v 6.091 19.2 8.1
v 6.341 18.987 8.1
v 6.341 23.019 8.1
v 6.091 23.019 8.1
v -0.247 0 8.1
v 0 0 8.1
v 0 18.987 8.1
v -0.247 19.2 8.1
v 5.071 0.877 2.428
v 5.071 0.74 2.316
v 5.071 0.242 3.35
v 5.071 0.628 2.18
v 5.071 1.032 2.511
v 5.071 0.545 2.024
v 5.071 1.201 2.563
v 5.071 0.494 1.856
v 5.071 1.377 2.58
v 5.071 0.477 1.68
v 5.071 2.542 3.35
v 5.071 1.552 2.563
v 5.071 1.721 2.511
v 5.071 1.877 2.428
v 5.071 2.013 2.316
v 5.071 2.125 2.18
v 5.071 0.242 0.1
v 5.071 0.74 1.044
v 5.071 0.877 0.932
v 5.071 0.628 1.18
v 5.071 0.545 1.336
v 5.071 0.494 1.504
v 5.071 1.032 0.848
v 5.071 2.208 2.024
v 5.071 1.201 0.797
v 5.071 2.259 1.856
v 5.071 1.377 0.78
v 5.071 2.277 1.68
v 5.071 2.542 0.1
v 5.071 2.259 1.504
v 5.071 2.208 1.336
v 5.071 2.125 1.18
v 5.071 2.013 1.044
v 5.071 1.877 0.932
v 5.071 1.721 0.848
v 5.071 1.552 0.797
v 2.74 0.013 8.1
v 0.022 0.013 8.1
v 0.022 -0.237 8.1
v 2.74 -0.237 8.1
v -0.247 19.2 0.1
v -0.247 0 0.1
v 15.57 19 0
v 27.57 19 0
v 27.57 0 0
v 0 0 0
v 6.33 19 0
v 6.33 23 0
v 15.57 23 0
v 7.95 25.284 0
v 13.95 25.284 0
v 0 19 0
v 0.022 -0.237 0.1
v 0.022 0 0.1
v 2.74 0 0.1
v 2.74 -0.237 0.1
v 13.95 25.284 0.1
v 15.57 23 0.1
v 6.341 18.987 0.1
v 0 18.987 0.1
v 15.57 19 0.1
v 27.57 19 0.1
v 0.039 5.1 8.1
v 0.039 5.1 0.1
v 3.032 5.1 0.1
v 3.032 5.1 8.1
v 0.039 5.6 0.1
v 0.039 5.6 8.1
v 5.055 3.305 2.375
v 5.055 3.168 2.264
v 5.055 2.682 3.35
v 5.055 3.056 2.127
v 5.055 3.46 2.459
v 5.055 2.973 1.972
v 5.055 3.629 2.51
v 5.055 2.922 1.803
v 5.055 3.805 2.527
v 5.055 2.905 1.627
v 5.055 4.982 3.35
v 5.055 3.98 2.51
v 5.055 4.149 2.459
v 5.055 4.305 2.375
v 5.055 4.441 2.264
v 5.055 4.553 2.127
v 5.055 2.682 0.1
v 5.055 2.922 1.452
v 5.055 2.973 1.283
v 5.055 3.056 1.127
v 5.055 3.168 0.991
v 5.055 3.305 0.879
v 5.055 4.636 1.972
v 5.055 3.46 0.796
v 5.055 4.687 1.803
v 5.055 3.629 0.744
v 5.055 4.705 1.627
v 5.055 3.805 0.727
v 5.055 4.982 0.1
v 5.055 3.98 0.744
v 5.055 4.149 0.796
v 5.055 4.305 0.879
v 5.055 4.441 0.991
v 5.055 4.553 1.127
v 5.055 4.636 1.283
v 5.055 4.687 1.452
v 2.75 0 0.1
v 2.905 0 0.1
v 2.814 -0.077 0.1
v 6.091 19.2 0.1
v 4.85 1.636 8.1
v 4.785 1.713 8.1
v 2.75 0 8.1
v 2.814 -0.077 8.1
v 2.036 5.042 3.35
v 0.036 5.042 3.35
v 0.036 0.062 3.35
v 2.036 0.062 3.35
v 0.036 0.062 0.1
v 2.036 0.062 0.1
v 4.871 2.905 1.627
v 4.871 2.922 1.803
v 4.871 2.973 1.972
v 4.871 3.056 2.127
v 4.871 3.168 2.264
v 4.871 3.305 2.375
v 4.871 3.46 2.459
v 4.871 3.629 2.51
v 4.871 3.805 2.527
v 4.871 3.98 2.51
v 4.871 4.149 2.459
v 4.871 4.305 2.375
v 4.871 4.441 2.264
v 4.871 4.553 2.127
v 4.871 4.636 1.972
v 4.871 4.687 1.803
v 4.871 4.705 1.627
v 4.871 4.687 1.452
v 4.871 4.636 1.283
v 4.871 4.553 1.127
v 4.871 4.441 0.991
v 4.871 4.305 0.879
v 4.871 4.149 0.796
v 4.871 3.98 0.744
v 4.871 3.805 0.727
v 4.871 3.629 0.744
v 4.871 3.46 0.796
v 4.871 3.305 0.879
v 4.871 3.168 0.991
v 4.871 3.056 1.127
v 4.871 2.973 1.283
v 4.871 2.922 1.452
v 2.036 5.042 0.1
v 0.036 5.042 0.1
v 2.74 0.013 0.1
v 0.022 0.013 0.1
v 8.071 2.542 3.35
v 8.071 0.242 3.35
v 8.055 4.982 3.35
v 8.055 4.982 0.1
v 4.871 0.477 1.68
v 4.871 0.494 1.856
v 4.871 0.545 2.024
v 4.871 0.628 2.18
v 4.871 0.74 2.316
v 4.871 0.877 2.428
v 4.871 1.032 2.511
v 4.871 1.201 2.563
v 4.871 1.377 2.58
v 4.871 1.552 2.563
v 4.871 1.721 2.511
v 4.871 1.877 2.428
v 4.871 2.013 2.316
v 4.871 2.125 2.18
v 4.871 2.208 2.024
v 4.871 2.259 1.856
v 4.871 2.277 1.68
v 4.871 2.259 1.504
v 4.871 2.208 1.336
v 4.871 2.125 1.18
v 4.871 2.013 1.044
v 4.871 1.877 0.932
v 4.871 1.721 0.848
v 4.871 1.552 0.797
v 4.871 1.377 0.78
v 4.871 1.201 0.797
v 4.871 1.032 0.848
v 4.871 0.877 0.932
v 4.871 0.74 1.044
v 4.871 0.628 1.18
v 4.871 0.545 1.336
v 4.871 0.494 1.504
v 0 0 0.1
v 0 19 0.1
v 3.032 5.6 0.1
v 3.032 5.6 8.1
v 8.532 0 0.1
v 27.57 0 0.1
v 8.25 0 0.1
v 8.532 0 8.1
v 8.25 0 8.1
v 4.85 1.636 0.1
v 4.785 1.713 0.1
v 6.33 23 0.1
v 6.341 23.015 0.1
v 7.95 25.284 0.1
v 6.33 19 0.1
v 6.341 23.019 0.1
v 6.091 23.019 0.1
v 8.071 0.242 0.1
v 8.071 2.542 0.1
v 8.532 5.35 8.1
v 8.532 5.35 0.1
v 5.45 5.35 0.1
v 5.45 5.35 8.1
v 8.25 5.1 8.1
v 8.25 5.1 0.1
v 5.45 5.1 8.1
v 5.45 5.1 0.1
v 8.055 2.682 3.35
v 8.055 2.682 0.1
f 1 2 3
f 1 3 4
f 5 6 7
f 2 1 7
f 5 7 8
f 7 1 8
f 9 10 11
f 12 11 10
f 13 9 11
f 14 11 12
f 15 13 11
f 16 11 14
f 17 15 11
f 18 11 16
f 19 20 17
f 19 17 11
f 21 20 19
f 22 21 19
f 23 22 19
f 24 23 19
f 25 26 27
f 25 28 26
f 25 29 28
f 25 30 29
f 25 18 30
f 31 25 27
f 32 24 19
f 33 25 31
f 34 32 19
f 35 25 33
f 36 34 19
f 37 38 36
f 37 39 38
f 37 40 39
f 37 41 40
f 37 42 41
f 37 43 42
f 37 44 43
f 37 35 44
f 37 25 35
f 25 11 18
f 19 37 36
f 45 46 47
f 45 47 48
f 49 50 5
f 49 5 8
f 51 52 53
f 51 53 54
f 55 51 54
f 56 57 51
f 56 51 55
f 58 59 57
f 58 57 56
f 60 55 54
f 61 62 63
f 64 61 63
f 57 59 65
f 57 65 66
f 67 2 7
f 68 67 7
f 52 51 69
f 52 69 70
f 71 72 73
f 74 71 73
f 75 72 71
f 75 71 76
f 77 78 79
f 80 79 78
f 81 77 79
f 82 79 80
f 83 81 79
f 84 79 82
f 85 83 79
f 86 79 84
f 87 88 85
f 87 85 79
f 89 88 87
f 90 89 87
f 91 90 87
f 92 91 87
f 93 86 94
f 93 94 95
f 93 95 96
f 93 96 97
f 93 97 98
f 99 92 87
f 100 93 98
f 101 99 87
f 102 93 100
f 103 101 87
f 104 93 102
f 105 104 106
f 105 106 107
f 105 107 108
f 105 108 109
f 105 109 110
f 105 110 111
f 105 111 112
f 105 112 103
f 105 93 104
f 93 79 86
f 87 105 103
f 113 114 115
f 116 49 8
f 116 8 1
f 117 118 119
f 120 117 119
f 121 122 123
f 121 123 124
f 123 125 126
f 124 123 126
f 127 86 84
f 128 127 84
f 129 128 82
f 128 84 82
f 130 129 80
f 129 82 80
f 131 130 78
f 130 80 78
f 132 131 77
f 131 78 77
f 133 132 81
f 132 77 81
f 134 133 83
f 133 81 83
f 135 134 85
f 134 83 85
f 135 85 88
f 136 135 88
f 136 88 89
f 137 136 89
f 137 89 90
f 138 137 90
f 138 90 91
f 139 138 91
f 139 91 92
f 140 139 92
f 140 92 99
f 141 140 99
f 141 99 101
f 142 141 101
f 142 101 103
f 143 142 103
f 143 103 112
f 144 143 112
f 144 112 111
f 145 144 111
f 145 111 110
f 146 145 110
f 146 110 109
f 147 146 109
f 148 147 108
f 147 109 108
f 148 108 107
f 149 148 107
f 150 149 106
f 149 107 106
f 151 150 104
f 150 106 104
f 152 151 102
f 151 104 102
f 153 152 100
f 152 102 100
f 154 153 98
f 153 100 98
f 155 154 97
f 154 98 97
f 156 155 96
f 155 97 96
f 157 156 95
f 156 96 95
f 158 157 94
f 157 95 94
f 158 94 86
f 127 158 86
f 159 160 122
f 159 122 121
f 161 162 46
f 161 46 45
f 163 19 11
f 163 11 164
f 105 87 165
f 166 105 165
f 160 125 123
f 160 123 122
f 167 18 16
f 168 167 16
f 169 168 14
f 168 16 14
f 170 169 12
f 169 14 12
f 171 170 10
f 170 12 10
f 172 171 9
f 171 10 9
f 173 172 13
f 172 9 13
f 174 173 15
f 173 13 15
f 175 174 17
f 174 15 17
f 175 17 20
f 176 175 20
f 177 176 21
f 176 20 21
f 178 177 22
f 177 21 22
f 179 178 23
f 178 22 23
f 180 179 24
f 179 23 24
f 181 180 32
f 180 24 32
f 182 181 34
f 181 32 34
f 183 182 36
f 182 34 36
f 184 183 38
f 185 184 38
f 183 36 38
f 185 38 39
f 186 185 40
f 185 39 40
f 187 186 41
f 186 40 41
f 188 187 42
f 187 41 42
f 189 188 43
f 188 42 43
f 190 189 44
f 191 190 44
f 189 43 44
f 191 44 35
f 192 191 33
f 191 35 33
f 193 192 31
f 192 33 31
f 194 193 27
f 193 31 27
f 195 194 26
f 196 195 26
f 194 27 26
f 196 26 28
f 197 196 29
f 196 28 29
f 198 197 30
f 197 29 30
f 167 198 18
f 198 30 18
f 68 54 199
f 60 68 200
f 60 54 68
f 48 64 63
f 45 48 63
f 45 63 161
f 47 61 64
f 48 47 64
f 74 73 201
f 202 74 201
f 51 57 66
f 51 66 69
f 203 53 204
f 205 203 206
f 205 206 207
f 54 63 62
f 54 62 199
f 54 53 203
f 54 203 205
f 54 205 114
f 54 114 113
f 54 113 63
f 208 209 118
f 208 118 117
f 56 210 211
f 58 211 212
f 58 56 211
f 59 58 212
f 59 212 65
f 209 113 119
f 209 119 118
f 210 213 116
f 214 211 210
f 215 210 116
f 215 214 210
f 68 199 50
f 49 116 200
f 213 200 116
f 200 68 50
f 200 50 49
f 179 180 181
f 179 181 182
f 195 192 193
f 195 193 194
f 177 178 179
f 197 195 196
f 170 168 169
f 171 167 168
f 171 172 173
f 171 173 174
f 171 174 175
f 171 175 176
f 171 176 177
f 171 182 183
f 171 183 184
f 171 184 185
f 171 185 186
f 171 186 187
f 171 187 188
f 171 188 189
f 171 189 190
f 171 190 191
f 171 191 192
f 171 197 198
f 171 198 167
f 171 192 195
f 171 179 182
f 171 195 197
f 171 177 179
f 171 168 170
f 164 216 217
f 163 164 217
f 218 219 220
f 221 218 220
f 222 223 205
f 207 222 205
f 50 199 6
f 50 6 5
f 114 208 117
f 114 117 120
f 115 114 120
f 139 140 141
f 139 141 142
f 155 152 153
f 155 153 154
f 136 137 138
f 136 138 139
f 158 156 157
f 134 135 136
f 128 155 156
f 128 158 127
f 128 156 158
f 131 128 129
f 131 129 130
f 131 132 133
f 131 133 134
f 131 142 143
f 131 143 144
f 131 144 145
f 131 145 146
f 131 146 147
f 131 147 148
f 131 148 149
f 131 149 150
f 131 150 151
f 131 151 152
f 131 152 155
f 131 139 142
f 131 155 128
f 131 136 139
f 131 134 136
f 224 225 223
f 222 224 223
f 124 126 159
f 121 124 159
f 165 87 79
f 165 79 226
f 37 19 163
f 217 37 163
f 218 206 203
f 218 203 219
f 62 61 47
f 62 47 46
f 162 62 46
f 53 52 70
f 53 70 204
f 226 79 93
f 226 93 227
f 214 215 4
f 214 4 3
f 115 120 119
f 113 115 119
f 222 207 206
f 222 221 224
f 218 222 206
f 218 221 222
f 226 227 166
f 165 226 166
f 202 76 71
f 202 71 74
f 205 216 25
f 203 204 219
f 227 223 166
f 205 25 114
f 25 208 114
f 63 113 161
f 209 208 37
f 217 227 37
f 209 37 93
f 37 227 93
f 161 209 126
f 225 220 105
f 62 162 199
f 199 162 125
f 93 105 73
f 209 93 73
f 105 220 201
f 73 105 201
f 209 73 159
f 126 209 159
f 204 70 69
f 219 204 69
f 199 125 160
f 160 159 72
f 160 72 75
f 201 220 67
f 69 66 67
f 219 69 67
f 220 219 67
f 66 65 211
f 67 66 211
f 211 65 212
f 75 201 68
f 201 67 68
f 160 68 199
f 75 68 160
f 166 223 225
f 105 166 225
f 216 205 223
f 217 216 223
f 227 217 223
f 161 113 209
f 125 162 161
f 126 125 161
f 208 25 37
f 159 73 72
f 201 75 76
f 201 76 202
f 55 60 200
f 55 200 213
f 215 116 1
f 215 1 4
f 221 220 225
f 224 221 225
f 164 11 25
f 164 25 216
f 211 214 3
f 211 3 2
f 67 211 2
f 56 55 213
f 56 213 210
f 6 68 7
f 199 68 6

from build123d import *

# Parameters (mm, degrees)
PAD_DEPTH     = 0.1
SKETCH001_W   = 2.992089
SKETCH001_H   = 0.5
SKETCH001_W_2 = 2.718208
SKETCH001_H_2 = 0.25
PAD001_DEPTH  = 8
SKETCH003_W   = 3
SKETCH003_H   = 2.3
SKETCH003_W_2 = 2
SKETCH003_H_2 = 4.980278
SKETCH003_W_3 = 0.25
SKETCH003_H_3 = 5.1
PAD002_DEPTH  = 3.25
SKETCH004_R   = 0.9
PAD003_DEPTH  = 0.2


with BuildPart() as part:
    # Sketch → Pad (new body)
    with BuildSketch(Plane.XY):
        Polygon((0, 0), (0, 19), (6.33, 19), (6.33, 23), (7.95, 25.283769), (13.95, 25.283769), (15.57, 23), (15.57, 19), (27.57, 19), (27.57, 0), align=None)
    extrude(amount=PAD_DEPTH)

    # Sketch001 → Pad001 (new body)
    with BuildSketch(Plane.XY.offset(0.1)):
        Polygon((0, 18.987083), (0, 0), (-0.247297, 0), (-0.247297, 19.200211), (6.090689, 19.200211), (6.090689, 23.019194), (6.340689, 23.019194), (6.340689, 18.987083), align=None)
        Polygon((5.45, 5.1), (8.25, 5.1), (8.25, 0), (8.532358, 0), (8.532358, 5.35), (5.45, 5.35), align=None)
        Polygon((2.75, 0), (4.785295, 1.712651), (4.84968, 1.636137), (2.814385, -0.076515), align=None)
        with Locations((1.535533, 5.35)):
            Rectangle(SKETCH001_W, SKETCH001_H)
        with Locations((1.380876, -0.111513)):
            Rectangle(SKETCH001_W_2, SKETCH001_H_2)
    extrude(amount=PAD001_DEPTH)

    # Sketch003 → Pad002 (new body)
    with BuildSketch(Plane.XY.offset(0.1)):
        with Locations((6.555456, 3.832422)):
            Rectangle(SKETCH003_W, SKETCH003_H)
        with Locations((6.570963, 1.391803)):
            Rectangle(SKETCH003_W, SKETCH003_H)
        with Locations((1.036032, 2.552082)):
            Rectangle(SKETCH003_W_2, SKETCH003_H_2)
        with Locations((8.375, 2.55)):
            Rectangle(SKETCH003_W_3, SKETCH003_H_3)
        Polygon((2.75, 0), (4.785295, 1.712651), (4.84968, 1.636137), (2.814385, -0.076515), align=None)
    extrude(amount=PAD002_DEPTH)

    # Sketch004 → Pad003 (new body)
    with BuildSketch(Plane(origin=(5.070963, 0, 0), x_dir=(0, -1, 0), z_dir=(-1, 0, 0))):
        with Locations((-3.804629, 1.627155)):
            Circle(SKETCH004_R)
        with Locations((-1.376705, 1.679936)):
            Circle(SKETCH004_R)
    extrude(amount=PAD003_DEPTH)


solid = part.part
